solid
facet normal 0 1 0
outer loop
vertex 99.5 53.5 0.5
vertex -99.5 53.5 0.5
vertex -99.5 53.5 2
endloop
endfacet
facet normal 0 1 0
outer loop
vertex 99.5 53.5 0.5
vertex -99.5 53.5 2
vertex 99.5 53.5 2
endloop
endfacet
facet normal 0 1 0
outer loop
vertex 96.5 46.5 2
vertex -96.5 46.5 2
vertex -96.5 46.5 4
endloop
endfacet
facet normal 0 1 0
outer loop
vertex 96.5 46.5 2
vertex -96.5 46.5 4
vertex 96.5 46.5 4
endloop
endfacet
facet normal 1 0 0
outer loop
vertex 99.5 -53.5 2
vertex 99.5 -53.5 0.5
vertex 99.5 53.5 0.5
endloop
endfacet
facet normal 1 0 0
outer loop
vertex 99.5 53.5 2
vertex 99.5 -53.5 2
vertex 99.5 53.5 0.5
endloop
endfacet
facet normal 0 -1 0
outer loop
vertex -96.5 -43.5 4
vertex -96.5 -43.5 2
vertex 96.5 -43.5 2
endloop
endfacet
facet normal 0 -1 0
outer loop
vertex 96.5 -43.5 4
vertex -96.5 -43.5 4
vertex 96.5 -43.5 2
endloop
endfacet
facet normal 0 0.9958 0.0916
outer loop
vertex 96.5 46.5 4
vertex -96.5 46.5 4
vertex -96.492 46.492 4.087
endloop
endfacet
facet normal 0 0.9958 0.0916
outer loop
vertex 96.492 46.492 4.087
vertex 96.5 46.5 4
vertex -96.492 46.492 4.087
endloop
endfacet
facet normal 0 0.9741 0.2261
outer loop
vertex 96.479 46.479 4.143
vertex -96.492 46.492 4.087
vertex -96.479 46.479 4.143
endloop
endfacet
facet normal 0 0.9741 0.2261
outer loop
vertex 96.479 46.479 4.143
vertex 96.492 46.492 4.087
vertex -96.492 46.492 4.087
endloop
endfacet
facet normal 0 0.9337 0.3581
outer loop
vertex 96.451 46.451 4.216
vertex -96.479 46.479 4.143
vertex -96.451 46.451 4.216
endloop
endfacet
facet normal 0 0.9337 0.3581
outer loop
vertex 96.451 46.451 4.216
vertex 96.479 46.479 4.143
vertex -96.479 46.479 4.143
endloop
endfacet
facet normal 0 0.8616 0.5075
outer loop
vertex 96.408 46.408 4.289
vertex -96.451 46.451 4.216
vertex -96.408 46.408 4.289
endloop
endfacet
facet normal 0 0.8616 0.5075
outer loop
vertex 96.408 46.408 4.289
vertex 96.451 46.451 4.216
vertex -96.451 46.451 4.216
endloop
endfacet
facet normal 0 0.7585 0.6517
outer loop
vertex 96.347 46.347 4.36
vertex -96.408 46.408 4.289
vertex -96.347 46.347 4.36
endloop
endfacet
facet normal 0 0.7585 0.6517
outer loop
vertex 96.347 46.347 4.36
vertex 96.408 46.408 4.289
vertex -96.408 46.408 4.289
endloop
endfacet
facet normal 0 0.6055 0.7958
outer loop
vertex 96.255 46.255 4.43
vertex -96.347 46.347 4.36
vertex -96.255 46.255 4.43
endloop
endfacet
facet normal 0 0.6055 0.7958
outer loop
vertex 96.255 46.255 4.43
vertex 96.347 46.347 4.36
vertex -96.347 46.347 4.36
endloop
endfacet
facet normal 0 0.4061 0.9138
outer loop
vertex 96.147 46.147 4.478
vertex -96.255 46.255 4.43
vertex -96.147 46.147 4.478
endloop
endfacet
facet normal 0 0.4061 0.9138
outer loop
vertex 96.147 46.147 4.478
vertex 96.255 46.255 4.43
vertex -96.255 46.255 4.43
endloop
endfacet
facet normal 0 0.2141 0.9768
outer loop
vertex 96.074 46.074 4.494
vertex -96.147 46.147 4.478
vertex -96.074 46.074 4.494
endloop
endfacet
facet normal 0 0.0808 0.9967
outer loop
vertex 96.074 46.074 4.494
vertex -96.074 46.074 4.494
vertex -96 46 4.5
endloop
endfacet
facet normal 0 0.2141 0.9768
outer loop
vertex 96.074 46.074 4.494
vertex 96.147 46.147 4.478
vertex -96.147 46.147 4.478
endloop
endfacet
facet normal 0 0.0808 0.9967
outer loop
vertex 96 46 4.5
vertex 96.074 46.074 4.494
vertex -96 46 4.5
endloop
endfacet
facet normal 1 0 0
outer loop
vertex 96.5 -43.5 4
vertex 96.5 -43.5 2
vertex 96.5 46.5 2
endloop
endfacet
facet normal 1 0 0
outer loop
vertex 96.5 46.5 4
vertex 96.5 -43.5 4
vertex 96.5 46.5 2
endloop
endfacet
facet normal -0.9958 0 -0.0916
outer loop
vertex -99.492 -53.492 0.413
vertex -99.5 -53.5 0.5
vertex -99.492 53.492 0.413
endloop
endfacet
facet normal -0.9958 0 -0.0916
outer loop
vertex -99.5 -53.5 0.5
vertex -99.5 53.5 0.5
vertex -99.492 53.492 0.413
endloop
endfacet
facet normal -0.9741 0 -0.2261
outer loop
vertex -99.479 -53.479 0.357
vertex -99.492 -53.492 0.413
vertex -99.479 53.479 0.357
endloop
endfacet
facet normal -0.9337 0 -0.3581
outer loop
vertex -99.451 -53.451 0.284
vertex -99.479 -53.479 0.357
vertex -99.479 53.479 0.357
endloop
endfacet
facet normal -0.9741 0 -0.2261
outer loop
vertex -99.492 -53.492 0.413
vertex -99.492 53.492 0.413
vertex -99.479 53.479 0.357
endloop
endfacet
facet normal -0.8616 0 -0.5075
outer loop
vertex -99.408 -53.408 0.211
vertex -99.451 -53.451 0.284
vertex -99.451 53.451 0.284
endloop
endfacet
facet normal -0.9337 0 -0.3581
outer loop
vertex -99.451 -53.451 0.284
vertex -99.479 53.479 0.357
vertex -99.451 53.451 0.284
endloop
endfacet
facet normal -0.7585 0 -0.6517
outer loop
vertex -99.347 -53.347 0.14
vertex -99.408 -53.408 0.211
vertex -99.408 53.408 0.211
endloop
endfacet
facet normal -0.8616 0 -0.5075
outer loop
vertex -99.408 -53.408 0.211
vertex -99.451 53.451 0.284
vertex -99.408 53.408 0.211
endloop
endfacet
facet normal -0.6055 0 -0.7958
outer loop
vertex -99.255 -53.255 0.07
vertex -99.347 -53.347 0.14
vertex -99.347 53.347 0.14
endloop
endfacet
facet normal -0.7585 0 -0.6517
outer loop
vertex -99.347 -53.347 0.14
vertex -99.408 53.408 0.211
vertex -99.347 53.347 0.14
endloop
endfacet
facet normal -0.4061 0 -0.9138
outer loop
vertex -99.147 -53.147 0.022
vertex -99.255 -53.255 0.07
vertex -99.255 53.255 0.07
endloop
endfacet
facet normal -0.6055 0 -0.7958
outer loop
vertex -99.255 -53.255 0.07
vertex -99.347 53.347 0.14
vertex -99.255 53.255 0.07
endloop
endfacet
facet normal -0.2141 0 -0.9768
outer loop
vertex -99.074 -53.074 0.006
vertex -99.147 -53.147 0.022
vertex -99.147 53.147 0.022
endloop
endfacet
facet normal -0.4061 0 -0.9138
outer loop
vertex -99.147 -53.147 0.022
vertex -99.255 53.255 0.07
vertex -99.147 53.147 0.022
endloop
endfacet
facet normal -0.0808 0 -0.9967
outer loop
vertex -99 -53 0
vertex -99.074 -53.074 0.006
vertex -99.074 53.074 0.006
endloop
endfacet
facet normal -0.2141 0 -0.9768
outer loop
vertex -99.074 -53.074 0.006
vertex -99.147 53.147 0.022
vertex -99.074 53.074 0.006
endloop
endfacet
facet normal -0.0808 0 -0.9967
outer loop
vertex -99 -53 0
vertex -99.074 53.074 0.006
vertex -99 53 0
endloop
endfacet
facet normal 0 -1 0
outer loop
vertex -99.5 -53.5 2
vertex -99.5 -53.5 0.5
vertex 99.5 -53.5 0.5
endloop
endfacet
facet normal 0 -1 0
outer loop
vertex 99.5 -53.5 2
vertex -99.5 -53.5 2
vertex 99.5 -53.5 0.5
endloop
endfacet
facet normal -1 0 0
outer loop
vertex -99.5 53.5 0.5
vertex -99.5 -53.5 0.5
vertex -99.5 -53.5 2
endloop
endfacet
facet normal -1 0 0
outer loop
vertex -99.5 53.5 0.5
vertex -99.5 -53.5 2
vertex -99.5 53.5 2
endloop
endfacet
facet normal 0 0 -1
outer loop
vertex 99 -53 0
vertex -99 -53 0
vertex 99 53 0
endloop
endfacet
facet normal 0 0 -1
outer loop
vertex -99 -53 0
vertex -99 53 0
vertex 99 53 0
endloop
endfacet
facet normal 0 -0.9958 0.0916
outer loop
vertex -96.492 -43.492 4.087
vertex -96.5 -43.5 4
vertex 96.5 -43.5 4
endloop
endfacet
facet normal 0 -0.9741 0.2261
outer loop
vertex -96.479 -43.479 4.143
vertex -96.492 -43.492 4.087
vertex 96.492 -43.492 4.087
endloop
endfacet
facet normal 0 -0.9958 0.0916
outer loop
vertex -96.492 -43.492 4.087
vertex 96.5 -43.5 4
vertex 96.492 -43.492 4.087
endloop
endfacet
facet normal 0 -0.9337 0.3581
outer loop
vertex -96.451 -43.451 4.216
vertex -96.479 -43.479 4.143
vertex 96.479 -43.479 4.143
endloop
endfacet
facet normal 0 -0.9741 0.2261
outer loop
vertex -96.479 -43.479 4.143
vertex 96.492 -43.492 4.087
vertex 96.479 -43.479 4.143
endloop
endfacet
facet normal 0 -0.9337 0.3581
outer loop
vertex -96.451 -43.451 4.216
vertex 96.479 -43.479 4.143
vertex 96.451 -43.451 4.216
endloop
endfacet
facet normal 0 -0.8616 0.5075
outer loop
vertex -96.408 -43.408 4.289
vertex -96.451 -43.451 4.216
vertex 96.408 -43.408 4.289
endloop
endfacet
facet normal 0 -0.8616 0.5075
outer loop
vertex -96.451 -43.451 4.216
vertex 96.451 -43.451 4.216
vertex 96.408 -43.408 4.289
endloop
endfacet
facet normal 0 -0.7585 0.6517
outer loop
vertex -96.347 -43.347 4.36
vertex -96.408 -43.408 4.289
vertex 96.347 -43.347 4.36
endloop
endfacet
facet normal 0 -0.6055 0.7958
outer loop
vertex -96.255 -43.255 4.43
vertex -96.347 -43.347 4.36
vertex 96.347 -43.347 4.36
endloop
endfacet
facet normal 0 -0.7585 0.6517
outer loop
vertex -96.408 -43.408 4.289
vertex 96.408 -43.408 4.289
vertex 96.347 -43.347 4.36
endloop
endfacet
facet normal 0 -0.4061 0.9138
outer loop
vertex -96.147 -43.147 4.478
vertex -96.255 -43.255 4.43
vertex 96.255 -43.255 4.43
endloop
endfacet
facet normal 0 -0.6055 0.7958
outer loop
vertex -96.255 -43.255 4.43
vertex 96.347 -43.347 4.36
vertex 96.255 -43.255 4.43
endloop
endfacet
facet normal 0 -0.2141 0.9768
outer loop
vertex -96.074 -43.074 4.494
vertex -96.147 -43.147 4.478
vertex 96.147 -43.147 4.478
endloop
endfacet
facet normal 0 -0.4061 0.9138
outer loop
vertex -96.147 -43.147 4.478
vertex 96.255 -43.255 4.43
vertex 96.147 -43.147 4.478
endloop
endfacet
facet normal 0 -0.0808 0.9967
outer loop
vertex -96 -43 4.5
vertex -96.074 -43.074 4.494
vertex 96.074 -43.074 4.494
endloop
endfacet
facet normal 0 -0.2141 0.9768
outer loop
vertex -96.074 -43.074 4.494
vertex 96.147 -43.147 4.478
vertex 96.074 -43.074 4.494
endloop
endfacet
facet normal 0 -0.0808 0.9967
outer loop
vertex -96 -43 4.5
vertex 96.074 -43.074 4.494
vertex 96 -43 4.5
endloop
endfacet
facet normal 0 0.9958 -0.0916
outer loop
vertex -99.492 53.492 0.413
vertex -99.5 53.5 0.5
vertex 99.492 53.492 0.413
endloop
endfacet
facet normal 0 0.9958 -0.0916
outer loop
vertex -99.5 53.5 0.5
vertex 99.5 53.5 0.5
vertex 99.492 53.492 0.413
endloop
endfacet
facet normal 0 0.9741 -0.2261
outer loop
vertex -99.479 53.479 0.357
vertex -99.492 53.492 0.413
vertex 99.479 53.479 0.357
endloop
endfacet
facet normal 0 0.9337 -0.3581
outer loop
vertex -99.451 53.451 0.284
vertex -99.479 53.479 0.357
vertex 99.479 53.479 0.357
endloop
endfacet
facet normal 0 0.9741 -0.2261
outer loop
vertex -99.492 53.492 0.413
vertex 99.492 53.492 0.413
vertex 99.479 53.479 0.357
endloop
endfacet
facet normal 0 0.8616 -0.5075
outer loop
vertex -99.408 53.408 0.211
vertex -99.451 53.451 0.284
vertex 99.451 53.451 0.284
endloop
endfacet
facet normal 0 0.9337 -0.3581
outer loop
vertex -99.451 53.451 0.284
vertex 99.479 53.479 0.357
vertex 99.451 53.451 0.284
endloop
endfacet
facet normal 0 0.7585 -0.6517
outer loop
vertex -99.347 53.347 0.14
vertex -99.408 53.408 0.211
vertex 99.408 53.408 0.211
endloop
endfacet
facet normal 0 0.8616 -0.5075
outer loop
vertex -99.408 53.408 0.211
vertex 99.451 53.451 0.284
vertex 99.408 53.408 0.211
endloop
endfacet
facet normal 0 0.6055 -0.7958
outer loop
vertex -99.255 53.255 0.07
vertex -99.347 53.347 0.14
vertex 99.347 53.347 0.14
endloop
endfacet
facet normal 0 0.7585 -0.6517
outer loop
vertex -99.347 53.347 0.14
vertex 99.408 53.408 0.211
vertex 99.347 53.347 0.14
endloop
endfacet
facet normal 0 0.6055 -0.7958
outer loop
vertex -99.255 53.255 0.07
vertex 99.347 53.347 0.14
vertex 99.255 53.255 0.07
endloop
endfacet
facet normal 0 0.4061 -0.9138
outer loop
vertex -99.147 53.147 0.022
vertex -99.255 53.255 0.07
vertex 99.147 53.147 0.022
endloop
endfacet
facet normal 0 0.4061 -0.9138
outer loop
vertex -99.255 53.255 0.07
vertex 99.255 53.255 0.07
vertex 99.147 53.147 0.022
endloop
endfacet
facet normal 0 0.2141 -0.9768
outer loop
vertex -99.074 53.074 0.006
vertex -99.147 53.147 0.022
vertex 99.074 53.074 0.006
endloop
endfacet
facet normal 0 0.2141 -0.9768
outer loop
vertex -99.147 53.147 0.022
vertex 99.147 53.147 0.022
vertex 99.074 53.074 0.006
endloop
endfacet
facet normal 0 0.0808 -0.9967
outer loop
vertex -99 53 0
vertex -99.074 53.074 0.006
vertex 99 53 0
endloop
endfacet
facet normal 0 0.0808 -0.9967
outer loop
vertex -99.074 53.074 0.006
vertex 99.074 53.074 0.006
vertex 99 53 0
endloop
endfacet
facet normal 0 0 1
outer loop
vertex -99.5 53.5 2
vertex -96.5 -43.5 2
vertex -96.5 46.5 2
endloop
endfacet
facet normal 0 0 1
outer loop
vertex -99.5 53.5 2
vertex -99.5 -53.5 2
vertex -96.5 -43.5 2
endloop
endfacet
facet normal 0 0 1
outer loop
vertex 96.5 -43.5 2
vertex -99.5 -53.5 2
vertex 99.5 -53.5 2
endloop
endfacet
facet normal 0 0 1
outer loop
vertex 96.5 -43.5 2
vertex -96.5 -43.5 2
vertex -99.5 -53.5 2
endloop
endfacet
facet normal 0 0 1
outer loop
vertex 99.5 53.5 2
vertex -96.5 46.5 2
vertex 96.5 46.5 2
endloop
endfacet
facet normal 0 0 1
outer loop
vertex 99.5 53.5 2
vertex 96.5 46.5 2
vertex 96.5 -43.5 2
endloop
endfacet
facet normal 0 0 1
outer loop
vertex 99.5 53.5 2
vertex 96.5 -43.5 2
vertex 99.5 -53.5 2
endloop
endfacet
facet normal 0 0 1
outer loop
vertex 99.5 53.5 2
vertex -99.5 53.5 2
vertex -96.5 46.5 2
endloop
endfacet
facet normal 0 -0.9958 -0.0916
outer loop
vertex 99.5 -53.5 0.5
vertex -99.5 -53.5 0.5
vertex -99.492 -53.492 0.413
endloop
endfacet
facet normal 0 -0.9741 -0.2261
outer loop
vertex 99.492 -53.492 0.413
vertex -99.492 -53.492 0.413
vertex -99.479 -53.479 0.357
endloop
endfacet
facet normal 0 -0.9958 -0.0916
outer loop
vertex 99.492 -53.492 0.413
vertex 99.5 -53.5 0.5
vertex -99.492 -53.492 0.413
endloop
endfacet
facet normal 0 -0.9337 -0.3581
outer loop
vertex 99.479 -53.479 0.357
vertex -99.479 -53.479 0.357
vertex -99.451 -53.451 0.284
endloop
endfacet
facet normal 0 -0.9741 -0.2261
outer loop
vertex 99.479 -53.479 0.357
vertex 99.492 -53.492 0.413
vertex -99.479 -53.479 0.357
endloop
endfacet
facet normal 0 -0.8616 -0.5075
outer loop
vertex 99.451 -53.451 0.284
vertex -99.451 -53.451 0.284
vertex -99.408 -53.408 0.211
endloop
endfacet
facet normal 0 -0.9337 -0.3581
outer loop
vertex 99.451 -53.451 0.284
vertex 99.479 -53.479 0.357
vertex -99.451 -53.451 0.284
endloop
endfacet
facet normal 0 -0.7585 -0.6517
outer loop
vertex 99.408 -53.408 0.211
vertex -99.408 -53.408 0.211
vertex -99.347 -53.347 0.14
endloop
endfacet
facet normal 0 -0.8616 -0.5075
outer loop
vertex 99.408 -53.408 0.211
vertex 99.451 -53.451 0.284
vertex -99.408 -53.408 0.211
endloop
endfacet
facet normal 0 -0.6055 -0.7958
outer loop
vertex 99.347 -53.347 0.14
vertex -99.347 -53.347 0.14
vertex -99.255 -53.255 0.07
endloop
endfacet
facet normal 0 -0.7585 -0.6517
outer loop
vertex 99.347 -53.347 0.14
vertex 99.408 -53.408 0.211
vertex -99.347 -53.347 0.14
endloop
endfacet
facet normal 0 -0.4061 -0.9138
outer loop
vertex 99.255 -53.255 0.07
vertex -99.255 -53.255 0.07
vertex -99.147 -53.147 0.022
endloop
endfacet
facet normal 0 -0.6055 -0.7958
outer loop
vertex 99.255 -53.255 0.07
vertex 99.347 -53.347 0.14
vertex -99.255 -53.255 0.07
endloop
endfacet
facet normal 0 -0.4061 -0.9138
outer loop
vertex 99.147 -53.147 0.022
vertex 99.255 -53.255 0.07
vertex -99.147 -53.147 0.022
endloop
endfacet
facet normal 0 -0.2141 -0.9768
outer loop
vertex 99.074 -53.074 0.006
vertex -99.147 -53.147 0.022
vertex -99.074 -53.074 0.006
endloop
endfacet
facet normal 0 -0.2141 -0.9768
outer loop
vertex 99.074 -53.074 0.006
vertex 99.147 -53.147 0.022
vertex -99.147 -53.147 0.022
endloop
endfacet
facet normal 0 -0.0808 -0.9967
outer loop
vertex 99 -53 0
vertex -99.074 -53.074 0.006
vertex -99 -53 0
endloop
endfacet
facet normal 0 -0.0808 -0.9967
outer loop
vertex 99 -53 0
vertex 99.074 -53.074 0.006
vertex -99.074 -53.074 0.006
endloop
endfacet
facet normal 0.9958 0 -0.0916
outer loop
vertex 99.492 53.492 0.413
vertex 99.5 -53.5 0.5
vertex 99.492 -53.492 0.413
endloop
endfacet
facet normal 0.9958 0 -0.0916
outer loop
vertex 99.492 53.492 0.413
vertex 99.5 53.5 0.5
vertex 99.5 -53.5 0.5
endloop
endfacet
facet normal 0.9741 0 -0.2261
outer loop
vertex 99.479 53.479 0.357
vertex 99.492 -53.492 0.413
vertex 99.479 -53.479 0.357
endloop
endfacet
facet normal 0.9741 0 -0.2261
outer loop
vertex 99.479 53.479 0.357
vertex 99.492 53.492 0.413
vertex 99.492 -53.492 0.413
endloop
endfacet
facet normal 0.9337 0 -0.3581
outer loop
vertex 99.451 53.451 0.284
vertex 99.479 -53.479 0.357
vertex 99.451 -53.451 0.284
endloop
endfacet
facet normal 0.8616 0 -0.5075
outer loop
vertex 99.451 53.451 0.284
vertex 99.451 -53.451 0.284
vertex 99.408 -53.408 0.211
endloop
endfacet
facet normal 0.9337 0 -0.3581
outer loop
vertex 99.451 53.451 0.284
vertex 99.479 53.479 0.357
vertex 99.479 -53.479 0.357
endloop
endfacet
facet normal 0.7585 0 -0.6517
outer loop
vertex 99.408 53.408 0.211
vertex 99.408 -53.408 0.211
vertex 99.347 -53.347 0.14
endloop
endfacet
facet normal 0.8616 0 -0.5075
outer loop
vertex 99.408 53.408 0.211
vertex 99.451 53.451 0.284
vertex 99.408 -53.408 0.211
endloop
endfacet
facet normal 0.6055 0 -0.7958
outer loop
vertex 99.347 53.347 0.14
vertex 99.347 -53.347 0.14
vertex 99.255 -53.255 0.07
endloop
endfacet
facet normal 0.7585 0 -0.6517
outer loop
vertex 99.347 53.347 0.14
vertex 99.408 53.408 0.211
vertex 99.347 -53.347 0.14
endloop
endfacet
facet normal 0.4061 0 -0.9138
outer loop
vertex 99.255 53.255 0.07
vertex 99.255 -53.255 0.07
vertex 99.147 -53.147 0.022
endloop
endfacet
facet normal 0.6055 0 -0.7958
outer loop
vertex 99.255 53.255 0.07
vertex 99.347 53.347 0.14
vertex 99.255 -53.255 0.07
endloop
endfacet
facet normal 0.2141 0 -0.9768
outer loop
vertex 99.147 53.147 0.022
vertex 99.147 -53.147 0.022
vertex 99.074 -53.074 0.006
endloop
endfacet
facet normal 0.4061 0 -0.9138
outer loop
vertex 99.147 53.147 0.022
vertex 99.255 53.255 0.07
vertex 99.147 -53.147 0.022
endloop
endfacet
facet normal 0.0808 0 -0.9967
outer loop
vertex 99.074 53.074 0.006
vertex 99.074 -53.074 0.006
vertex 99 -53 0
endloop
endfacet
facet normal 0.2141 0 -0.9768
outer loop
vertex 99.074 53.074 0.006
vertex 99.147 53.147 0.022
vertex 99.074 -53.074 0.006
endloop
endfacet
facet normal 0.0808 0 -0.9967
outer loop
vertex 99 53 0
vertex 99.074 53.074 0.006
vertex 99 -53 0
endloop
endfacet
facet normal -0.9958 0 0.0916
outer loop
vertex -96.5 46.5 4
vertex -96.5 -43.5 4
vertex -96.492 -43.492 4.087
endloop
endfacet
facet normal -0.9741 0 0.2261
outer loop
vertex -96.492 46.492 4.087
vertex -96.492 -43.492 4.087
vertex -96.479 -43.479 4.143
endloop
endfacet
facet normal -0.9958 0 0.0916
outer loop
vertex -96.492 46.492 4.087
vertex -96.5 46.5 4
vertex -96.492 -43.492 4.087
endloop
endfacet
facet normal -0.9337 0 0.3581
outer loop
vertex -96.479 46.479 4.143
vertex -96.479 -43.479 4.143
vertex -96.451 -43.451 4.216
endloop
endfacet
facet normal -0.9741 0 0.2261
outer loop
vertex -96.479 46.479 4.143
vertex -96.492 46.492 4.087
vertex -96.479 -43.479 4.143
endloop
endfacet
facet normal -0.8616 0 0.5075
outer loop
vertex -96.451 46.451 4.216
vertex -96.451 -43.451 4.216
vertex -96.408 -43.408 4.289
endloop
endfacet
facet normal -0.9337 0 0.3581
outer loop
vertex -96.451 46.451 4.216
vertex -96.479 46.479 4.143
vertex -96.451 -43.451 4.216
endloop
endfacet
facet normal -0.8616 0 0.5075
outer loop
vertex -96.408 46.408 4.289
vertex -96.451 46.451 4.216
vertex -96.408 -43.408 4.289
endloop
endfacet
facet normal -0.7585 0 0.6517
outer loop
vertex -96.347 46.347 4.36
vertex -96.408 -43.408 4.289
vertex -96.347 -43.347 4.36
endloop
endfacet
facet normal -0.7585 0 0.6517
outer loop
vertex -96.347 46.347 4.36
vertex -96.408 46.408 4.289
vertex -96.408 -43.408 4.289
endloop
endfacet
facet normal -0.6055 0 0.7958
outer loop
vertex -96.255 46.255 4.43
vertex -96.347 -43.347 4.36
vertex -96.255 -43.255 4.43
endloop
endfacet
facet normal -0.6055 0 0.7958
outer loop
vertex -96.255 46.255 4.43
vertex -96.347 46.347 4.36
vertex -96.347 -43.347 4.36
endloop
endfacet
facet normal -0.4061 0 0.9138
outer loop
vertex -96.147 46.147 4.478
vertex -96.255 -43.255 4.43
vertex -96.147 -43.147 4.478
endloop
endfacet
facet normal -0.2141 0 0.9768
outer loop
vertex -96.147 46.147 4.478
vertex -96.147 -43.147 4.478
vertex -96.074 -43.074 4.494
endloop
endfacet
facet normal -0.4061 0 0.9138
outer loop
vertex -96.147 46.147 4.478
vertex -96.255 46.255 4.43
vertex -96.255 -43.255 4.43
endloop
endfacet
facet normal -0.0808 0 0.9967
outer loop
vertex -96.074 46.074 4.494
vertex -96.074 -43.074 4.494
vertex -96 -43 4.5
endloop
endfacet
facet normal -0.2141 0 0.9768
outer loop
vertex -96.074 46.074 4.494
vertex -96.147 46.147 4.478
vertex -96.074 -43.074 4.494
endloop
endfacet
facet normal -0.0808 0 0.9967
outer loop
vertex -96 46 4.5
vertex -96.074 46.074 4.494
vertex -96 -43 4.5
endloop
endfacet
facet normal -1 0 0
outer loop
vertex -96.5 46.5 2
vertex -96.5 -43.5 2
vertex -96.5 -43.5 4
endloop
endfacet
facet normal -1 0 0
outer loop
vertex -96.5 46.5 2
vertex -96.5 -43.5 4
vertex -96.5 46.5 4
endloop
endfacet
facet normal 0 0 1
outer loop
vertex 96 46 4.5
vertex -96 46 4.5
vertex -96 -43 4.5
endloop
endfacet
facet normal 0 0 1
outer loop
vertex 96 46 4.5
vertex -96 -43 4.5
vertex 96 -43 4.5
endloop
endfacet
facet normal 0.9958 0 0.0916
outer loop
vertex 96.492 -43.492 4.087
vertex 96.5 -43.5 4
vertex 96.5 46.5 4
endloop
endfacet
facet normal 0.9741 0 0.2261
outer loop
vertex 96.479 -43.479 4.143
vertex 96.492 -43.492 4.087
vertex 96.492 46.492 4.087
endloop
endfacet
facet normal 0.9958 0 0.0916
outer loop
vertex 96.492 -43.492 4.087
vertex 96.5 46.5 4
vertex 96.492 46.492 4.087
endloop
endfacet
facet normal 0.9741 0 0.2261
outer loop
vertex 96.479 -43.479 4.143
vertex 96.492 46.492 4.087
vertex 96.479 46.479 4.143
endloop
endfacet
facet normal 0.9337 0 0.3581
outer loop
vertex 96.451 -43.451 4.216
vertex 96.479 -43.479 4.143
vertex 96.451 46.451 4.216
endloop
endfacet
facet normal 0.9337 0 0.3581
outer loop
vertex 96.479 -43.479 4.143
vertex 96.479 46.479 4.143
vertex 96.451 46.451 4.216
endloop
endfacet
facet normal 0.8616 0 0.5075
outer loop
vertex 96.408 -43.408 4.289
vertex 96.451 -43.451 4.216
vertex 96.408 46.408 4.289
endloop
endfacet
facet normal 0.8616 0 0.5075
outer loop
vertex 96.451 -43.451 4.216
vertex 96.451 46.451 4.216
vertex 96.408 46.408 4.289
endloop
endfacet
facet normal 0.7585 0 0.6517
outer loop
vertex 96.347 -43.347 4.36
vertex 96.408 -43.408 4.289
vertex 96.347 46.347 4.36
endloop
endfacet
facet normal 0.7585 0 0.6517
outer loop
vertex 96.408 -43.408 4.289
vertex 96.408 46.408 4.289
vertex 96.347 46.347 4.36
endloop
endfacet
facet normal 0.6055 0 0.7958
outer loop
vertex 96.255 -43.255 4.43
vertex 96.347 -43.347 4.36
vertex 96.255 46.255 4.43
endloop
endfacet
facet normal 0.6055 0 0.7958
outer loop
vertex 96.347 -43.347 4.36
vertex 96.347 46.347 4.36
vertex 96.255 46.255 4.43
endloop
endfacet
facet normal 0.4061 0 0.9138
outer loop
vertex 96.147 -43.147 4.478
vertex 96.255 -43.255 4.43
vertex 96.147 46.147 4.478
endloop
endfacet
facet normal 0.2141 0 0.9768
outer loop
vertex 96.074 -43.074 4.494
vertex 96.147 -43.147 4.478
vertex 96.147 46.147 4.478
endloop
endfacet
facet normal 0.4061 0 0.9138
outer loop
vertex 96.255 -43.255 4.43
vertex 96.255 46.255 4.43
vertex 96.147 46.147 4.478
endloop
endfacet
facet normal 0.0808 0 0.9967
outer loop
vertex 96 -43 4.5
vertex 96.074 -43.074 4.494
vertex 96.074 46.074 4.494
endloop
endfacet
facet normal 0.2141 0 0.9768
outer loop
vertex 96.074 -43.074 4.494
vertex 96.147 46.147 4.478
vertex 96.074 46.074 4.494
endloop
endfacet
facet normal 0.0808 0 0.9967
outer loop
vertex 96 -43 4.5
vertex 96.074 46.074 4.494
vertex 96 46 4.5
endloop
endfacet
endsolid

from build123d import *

# Parameters (mm, degrees)
SKETCH1_W           = 199
SKETCH1_H           = 107
BOSS_EXTRUDE1_DEPTH = 2
SKETCH2_W           = 193
SKETCH2_H           = 90
BOSS_EXTRUDE2_DEPTH = 2.5
FILLET2_R           = 0.5
FILLET3_R           = 0.5


with BuildPart() as part:
    # Sketch1 → Boss-Extrude1 (new body)
    with BuildSketch(Plane.XY):
        Rectangle(SKETCH1_W, SKETCH1_H)
    extrude(amount=BOSS_EXTRUDE1_DEPTH)

    # Sketch2 → Boss-Extrude2 (add)
    with BuildSketch(Plane.XY.offset(2)):
        with Locations((0, 1.5)):
            Rectangle(SKETCH2_W, SKETCH2_H)
    extrude(amount=BOSS_EXTRUDE2_DEPTH)

    # Fillet2
    fillet2_edges = [part.edges().sort_by_distance(p)[0] for p in [
        (-96.5, 1.5, 4.5),
        (0, -43.5, 4.5),
        (96.5, 1.5, 4.5),
        (0, 46.5, 4.5),
    ]]
    fillet(fillet2_edges, radius=FILLET2_R)

    # Fillet3
    fillet3_edges = [part.edges().sort_by_distance(p)[0] for p in [
        (0, -53.5, 0),
        (-99.5, 0, 0),
        (0, 53.5, 0),
        (99.5, 0, 0),
    ]]
    fillet(fillet3_edges, radius=FILLET3_R)


solid = part.part
